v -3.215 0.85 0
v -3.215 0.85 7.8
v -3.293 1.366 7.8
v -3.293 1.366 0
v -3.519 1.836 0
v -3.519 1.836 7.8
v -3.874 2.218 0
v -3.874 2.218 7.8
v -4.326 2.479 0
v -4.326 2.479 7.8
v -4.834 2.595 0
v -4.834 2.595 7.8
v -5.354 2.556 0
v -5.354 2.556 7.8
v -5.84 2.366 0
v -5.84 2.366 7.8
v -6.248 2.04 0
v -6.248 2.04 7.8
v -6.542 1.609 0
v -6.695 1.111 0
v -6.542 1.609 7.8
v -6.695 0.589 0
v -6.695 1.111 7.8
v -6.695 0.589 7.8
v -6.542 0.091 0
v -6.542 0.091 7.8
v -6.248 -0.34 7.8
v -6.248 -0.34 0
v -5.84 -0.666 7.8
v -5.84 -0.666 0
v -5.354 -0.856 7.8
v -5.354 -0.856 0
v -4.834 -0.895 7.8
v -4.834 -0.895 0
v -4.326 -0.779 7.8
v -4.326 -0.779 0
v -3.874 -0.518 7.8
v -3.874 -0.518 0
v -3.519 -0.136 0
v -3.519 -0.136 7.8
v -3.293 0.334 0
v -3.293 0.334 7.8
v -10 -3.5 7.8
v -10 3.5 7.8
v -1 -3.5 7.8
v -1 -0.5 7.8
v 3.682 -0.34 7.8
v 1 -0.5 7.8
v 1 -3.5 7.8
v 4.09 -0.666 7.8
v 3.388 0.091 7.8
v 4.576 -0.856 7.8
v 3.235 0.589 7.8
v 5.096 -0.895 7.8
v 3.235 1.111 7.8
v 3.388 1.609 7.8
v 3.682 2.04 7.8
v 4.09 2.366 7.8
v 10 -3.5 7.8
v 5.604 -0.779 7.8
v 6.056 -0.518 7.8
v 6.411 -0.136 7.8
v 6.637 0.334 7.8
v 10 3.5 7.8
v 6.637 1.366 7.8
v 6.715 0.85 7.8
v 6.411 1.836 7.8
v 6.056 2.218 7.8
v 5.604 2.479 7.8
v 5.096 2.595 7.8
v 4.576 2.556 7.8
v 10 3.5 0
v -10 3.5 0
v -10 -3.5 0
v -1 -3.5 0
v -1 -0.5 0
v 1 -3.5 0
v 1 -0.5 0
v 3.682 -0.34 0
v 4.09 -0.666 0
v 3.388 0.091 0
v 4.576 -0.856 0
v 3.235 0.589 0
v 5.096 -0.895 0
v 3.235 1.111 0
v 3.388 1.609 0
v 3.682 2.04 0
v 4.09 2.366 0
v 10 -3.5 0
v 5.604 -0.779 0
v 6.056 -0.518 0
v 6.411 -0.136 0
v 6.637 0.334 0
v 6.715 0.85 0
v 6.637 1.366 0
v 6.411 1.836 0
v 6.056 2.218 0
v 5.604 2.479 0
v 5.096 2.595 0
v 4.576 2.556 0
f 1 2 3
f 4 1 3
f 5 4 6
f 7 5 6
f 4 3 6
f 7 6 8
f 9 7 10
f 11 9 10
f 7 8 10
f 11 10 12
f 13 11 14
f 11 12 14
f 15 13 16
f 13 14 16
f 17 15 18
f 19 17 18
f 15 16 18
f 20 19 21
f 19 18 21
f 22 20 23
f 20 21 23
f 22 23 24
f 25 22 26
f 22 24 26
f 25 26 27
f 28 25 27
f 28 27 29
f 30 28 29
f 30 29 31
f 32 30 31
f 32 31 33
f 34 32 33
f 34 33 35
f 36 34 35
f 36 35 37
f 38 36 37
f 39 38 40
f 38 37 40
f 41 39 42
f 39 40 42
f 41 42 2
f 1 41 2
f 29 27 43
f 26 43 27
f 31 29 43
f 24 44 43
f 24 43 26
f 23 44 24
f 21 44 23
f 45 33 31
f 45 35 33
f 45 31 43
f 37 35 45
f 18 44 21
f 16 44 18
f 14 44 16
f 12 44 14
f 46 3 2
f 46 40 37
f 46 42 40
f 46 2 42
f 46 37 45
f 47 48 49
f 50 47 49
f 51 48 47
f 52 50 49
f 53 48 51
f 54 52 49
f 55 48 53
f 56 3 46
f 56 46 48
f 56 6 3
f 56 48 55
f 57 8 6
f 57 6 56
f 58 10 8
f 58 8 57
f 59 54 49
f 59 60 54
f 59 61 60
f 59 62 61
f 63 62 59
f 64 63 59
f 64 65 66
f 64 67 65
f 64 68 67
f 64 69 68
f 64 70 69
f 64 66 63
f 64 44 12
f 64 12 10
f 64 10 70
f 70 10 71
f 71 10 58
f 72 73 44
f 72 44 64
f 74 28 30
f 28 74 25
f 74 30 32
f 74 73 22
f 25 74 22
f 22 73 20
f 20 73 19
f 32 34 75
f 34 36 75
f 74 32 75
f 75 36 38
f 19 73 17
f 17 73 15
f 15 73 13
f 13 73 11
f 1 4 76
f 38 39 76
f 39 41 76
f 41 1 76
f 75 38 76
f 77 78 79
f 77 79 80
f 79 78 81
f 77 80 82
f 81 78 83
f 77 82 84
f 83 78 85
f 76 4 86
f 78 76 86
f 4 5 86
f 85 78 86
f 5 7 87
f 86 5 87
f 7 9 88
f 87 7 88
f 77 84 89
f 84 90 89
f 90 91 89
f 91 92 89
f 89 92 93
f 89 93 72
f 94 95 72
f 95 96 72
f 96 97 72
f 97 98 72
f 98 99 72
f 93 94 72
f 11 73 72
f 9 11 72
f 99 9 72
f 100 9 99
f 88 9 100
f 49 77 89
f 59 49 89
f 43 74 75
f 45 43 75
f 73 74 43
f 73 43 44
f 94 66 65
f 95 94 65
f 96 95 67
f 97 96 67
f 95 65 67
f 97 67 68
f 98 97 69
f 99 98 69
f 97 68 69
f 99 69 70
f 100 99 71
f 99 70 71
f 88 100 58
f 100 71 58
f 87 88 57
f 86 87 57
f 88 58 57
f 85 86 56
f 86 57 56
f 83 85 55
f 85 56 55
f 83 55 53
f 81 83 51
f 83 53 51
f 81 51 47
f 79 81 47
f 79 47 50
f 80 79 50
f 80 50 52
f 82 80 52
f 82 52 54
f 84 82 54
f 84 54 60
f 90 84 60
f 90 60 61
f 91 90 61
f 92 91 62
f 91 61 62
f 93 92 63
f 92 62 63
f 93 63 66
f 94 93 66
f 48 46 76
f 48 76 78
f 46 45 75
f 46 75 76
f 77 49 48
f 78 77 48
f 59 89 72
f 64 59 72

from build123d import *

# Parameters (mm, degrees)
SKETCH_1_W          = 20
SKETCH_1_H          = 7
EXTRUDE_1_DEPTH     = 7.8
SKETCH_2_R          = 1.75
CUT_EXTRUDE_1_DEPTH = 7.8
SKETCH_3_W          = 2
SKETCH_3_H          = 3
CUT_EXTRUDE_2_DEPTH = 7.8


with BuildPart() as part:
    # 草图1 → 凸台-拉伸1 (new body)
    with BuildSketch(Plane.XY):
        Rectangle(SKETCH_1_W, SKETCH_1_H)
    extrude(amount=EXTRUDE_1_DEPTH)

    # 草图2 → 切除-拉伸1 (cut)
    with BuildSketch(Plane.XY.offset(7.8)):
        with Locations((-4.965, 0.85)):
            Circle(SKETCH_2_R)
        with Locations((4.965, 0.85)):
            Circle(SKETCH_2_R)
    extrude(amount=-CUT_EXTRUDE_1_DEPTH, mode=Mode.SUBTRACT)

    # 草图3 → 切除-拉伸2 (cut)
    with BuildSketch(Plane.XY.offset(7.8)):
        with Locations((0, -2)):
            Rectangle(SKETCH_3_W, SKETCH_3_H)
    extrude(amount=-CUT_EXTRUDE_2_DEPTH, mode=Mode.SUBTRACT)


solid = part.part
